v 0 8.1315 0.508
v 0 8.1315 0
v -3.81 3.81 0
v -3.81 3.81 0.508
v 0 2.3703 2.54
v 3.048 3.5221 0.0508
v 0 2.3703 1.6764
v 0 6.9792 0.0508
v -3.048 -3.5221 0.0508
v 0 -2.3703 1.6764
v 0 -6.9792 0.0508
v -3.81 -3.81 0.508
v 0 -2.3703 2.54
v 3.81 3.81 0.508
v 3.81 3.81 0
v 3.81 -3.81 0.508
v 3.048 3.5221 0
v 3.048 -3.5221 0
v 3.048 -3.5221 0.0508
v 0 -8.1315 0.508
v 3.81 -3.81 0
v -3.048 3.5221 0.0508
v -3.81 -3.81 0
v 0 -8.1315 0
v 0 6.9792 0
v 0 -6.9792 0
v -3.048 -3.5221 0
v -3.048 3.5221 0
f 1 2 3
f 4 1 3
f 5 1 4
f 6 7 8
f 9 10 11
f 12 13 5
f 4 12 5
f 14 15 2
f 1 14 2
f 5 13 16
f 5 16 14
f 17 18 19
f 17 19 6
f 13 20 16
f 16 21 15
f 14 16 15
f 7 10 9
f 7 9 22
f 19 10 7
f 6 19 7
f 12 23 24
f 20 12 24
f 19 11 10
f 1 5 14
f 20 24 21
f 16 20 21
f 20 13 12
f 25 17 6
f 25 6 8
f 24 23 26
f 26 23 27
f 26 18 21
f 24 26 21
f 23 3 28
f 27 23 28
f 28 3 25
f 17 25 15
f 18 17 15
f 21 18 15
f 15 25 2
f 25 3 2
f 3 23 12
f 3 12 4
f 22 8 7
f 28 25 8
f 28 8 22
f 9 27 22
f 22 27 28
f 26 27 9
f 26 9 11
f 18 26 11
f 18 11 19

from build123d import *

# Parameters (mm, degrees)
F0_W     = 7.62
F0_H     = 7.62
F1_DEPTH = 2.54
F2_SIZE2 = 3.80999
F2_SIZE  = 2.03199
F3_T     = -0.762


# Not quite as in the source:
# - a fillet or chamfer is up to 0.001 mm smaller than in the source, because OpenCascade refuses the exact size


with BuildPart() as f1:
    # F0 (on Top) → F1 (new body)
    with BuildSketch(Plane.XY):
        Rectangle(F0_W, F0_H)
        Polygon((-3.81, 3.81), (3.81, 3.81), (0, 8.1314574927), align=None)
        Polygon((0, -8.1314574927), (3.81, -3.81), (-3.81, -3.81), align=None)
    extrude(amount=F1_DEPTH)

    # F2 (size 2.032 and 3.81 in the source; OpenCascade refuses exactly that, so slightly less here)
    f2_edges = [f1.edges().sort_by_distance(p)[0] for p in [
        (3.81, 0, 2.54),
        (1.905, 5.970729, 2.54),
        (-1.905, -5.970729, 2.54),
        (-3.81, 0, 2.54),
        (-1.905, 5.970729, 2.54),
        (1.905, -5.970729, 2.54),
    ]]
    chamfer(f2_edges, length=F2_SIZE, length2=F2_SIZE2)

    # F3
    f3_openings = [f1.faces().sort_by_distance(p)[0] for p in [
        (0, 0, 0),
    ]]
    offset(amount=F3_T, openings=f3_openings)


solid = f1.part
